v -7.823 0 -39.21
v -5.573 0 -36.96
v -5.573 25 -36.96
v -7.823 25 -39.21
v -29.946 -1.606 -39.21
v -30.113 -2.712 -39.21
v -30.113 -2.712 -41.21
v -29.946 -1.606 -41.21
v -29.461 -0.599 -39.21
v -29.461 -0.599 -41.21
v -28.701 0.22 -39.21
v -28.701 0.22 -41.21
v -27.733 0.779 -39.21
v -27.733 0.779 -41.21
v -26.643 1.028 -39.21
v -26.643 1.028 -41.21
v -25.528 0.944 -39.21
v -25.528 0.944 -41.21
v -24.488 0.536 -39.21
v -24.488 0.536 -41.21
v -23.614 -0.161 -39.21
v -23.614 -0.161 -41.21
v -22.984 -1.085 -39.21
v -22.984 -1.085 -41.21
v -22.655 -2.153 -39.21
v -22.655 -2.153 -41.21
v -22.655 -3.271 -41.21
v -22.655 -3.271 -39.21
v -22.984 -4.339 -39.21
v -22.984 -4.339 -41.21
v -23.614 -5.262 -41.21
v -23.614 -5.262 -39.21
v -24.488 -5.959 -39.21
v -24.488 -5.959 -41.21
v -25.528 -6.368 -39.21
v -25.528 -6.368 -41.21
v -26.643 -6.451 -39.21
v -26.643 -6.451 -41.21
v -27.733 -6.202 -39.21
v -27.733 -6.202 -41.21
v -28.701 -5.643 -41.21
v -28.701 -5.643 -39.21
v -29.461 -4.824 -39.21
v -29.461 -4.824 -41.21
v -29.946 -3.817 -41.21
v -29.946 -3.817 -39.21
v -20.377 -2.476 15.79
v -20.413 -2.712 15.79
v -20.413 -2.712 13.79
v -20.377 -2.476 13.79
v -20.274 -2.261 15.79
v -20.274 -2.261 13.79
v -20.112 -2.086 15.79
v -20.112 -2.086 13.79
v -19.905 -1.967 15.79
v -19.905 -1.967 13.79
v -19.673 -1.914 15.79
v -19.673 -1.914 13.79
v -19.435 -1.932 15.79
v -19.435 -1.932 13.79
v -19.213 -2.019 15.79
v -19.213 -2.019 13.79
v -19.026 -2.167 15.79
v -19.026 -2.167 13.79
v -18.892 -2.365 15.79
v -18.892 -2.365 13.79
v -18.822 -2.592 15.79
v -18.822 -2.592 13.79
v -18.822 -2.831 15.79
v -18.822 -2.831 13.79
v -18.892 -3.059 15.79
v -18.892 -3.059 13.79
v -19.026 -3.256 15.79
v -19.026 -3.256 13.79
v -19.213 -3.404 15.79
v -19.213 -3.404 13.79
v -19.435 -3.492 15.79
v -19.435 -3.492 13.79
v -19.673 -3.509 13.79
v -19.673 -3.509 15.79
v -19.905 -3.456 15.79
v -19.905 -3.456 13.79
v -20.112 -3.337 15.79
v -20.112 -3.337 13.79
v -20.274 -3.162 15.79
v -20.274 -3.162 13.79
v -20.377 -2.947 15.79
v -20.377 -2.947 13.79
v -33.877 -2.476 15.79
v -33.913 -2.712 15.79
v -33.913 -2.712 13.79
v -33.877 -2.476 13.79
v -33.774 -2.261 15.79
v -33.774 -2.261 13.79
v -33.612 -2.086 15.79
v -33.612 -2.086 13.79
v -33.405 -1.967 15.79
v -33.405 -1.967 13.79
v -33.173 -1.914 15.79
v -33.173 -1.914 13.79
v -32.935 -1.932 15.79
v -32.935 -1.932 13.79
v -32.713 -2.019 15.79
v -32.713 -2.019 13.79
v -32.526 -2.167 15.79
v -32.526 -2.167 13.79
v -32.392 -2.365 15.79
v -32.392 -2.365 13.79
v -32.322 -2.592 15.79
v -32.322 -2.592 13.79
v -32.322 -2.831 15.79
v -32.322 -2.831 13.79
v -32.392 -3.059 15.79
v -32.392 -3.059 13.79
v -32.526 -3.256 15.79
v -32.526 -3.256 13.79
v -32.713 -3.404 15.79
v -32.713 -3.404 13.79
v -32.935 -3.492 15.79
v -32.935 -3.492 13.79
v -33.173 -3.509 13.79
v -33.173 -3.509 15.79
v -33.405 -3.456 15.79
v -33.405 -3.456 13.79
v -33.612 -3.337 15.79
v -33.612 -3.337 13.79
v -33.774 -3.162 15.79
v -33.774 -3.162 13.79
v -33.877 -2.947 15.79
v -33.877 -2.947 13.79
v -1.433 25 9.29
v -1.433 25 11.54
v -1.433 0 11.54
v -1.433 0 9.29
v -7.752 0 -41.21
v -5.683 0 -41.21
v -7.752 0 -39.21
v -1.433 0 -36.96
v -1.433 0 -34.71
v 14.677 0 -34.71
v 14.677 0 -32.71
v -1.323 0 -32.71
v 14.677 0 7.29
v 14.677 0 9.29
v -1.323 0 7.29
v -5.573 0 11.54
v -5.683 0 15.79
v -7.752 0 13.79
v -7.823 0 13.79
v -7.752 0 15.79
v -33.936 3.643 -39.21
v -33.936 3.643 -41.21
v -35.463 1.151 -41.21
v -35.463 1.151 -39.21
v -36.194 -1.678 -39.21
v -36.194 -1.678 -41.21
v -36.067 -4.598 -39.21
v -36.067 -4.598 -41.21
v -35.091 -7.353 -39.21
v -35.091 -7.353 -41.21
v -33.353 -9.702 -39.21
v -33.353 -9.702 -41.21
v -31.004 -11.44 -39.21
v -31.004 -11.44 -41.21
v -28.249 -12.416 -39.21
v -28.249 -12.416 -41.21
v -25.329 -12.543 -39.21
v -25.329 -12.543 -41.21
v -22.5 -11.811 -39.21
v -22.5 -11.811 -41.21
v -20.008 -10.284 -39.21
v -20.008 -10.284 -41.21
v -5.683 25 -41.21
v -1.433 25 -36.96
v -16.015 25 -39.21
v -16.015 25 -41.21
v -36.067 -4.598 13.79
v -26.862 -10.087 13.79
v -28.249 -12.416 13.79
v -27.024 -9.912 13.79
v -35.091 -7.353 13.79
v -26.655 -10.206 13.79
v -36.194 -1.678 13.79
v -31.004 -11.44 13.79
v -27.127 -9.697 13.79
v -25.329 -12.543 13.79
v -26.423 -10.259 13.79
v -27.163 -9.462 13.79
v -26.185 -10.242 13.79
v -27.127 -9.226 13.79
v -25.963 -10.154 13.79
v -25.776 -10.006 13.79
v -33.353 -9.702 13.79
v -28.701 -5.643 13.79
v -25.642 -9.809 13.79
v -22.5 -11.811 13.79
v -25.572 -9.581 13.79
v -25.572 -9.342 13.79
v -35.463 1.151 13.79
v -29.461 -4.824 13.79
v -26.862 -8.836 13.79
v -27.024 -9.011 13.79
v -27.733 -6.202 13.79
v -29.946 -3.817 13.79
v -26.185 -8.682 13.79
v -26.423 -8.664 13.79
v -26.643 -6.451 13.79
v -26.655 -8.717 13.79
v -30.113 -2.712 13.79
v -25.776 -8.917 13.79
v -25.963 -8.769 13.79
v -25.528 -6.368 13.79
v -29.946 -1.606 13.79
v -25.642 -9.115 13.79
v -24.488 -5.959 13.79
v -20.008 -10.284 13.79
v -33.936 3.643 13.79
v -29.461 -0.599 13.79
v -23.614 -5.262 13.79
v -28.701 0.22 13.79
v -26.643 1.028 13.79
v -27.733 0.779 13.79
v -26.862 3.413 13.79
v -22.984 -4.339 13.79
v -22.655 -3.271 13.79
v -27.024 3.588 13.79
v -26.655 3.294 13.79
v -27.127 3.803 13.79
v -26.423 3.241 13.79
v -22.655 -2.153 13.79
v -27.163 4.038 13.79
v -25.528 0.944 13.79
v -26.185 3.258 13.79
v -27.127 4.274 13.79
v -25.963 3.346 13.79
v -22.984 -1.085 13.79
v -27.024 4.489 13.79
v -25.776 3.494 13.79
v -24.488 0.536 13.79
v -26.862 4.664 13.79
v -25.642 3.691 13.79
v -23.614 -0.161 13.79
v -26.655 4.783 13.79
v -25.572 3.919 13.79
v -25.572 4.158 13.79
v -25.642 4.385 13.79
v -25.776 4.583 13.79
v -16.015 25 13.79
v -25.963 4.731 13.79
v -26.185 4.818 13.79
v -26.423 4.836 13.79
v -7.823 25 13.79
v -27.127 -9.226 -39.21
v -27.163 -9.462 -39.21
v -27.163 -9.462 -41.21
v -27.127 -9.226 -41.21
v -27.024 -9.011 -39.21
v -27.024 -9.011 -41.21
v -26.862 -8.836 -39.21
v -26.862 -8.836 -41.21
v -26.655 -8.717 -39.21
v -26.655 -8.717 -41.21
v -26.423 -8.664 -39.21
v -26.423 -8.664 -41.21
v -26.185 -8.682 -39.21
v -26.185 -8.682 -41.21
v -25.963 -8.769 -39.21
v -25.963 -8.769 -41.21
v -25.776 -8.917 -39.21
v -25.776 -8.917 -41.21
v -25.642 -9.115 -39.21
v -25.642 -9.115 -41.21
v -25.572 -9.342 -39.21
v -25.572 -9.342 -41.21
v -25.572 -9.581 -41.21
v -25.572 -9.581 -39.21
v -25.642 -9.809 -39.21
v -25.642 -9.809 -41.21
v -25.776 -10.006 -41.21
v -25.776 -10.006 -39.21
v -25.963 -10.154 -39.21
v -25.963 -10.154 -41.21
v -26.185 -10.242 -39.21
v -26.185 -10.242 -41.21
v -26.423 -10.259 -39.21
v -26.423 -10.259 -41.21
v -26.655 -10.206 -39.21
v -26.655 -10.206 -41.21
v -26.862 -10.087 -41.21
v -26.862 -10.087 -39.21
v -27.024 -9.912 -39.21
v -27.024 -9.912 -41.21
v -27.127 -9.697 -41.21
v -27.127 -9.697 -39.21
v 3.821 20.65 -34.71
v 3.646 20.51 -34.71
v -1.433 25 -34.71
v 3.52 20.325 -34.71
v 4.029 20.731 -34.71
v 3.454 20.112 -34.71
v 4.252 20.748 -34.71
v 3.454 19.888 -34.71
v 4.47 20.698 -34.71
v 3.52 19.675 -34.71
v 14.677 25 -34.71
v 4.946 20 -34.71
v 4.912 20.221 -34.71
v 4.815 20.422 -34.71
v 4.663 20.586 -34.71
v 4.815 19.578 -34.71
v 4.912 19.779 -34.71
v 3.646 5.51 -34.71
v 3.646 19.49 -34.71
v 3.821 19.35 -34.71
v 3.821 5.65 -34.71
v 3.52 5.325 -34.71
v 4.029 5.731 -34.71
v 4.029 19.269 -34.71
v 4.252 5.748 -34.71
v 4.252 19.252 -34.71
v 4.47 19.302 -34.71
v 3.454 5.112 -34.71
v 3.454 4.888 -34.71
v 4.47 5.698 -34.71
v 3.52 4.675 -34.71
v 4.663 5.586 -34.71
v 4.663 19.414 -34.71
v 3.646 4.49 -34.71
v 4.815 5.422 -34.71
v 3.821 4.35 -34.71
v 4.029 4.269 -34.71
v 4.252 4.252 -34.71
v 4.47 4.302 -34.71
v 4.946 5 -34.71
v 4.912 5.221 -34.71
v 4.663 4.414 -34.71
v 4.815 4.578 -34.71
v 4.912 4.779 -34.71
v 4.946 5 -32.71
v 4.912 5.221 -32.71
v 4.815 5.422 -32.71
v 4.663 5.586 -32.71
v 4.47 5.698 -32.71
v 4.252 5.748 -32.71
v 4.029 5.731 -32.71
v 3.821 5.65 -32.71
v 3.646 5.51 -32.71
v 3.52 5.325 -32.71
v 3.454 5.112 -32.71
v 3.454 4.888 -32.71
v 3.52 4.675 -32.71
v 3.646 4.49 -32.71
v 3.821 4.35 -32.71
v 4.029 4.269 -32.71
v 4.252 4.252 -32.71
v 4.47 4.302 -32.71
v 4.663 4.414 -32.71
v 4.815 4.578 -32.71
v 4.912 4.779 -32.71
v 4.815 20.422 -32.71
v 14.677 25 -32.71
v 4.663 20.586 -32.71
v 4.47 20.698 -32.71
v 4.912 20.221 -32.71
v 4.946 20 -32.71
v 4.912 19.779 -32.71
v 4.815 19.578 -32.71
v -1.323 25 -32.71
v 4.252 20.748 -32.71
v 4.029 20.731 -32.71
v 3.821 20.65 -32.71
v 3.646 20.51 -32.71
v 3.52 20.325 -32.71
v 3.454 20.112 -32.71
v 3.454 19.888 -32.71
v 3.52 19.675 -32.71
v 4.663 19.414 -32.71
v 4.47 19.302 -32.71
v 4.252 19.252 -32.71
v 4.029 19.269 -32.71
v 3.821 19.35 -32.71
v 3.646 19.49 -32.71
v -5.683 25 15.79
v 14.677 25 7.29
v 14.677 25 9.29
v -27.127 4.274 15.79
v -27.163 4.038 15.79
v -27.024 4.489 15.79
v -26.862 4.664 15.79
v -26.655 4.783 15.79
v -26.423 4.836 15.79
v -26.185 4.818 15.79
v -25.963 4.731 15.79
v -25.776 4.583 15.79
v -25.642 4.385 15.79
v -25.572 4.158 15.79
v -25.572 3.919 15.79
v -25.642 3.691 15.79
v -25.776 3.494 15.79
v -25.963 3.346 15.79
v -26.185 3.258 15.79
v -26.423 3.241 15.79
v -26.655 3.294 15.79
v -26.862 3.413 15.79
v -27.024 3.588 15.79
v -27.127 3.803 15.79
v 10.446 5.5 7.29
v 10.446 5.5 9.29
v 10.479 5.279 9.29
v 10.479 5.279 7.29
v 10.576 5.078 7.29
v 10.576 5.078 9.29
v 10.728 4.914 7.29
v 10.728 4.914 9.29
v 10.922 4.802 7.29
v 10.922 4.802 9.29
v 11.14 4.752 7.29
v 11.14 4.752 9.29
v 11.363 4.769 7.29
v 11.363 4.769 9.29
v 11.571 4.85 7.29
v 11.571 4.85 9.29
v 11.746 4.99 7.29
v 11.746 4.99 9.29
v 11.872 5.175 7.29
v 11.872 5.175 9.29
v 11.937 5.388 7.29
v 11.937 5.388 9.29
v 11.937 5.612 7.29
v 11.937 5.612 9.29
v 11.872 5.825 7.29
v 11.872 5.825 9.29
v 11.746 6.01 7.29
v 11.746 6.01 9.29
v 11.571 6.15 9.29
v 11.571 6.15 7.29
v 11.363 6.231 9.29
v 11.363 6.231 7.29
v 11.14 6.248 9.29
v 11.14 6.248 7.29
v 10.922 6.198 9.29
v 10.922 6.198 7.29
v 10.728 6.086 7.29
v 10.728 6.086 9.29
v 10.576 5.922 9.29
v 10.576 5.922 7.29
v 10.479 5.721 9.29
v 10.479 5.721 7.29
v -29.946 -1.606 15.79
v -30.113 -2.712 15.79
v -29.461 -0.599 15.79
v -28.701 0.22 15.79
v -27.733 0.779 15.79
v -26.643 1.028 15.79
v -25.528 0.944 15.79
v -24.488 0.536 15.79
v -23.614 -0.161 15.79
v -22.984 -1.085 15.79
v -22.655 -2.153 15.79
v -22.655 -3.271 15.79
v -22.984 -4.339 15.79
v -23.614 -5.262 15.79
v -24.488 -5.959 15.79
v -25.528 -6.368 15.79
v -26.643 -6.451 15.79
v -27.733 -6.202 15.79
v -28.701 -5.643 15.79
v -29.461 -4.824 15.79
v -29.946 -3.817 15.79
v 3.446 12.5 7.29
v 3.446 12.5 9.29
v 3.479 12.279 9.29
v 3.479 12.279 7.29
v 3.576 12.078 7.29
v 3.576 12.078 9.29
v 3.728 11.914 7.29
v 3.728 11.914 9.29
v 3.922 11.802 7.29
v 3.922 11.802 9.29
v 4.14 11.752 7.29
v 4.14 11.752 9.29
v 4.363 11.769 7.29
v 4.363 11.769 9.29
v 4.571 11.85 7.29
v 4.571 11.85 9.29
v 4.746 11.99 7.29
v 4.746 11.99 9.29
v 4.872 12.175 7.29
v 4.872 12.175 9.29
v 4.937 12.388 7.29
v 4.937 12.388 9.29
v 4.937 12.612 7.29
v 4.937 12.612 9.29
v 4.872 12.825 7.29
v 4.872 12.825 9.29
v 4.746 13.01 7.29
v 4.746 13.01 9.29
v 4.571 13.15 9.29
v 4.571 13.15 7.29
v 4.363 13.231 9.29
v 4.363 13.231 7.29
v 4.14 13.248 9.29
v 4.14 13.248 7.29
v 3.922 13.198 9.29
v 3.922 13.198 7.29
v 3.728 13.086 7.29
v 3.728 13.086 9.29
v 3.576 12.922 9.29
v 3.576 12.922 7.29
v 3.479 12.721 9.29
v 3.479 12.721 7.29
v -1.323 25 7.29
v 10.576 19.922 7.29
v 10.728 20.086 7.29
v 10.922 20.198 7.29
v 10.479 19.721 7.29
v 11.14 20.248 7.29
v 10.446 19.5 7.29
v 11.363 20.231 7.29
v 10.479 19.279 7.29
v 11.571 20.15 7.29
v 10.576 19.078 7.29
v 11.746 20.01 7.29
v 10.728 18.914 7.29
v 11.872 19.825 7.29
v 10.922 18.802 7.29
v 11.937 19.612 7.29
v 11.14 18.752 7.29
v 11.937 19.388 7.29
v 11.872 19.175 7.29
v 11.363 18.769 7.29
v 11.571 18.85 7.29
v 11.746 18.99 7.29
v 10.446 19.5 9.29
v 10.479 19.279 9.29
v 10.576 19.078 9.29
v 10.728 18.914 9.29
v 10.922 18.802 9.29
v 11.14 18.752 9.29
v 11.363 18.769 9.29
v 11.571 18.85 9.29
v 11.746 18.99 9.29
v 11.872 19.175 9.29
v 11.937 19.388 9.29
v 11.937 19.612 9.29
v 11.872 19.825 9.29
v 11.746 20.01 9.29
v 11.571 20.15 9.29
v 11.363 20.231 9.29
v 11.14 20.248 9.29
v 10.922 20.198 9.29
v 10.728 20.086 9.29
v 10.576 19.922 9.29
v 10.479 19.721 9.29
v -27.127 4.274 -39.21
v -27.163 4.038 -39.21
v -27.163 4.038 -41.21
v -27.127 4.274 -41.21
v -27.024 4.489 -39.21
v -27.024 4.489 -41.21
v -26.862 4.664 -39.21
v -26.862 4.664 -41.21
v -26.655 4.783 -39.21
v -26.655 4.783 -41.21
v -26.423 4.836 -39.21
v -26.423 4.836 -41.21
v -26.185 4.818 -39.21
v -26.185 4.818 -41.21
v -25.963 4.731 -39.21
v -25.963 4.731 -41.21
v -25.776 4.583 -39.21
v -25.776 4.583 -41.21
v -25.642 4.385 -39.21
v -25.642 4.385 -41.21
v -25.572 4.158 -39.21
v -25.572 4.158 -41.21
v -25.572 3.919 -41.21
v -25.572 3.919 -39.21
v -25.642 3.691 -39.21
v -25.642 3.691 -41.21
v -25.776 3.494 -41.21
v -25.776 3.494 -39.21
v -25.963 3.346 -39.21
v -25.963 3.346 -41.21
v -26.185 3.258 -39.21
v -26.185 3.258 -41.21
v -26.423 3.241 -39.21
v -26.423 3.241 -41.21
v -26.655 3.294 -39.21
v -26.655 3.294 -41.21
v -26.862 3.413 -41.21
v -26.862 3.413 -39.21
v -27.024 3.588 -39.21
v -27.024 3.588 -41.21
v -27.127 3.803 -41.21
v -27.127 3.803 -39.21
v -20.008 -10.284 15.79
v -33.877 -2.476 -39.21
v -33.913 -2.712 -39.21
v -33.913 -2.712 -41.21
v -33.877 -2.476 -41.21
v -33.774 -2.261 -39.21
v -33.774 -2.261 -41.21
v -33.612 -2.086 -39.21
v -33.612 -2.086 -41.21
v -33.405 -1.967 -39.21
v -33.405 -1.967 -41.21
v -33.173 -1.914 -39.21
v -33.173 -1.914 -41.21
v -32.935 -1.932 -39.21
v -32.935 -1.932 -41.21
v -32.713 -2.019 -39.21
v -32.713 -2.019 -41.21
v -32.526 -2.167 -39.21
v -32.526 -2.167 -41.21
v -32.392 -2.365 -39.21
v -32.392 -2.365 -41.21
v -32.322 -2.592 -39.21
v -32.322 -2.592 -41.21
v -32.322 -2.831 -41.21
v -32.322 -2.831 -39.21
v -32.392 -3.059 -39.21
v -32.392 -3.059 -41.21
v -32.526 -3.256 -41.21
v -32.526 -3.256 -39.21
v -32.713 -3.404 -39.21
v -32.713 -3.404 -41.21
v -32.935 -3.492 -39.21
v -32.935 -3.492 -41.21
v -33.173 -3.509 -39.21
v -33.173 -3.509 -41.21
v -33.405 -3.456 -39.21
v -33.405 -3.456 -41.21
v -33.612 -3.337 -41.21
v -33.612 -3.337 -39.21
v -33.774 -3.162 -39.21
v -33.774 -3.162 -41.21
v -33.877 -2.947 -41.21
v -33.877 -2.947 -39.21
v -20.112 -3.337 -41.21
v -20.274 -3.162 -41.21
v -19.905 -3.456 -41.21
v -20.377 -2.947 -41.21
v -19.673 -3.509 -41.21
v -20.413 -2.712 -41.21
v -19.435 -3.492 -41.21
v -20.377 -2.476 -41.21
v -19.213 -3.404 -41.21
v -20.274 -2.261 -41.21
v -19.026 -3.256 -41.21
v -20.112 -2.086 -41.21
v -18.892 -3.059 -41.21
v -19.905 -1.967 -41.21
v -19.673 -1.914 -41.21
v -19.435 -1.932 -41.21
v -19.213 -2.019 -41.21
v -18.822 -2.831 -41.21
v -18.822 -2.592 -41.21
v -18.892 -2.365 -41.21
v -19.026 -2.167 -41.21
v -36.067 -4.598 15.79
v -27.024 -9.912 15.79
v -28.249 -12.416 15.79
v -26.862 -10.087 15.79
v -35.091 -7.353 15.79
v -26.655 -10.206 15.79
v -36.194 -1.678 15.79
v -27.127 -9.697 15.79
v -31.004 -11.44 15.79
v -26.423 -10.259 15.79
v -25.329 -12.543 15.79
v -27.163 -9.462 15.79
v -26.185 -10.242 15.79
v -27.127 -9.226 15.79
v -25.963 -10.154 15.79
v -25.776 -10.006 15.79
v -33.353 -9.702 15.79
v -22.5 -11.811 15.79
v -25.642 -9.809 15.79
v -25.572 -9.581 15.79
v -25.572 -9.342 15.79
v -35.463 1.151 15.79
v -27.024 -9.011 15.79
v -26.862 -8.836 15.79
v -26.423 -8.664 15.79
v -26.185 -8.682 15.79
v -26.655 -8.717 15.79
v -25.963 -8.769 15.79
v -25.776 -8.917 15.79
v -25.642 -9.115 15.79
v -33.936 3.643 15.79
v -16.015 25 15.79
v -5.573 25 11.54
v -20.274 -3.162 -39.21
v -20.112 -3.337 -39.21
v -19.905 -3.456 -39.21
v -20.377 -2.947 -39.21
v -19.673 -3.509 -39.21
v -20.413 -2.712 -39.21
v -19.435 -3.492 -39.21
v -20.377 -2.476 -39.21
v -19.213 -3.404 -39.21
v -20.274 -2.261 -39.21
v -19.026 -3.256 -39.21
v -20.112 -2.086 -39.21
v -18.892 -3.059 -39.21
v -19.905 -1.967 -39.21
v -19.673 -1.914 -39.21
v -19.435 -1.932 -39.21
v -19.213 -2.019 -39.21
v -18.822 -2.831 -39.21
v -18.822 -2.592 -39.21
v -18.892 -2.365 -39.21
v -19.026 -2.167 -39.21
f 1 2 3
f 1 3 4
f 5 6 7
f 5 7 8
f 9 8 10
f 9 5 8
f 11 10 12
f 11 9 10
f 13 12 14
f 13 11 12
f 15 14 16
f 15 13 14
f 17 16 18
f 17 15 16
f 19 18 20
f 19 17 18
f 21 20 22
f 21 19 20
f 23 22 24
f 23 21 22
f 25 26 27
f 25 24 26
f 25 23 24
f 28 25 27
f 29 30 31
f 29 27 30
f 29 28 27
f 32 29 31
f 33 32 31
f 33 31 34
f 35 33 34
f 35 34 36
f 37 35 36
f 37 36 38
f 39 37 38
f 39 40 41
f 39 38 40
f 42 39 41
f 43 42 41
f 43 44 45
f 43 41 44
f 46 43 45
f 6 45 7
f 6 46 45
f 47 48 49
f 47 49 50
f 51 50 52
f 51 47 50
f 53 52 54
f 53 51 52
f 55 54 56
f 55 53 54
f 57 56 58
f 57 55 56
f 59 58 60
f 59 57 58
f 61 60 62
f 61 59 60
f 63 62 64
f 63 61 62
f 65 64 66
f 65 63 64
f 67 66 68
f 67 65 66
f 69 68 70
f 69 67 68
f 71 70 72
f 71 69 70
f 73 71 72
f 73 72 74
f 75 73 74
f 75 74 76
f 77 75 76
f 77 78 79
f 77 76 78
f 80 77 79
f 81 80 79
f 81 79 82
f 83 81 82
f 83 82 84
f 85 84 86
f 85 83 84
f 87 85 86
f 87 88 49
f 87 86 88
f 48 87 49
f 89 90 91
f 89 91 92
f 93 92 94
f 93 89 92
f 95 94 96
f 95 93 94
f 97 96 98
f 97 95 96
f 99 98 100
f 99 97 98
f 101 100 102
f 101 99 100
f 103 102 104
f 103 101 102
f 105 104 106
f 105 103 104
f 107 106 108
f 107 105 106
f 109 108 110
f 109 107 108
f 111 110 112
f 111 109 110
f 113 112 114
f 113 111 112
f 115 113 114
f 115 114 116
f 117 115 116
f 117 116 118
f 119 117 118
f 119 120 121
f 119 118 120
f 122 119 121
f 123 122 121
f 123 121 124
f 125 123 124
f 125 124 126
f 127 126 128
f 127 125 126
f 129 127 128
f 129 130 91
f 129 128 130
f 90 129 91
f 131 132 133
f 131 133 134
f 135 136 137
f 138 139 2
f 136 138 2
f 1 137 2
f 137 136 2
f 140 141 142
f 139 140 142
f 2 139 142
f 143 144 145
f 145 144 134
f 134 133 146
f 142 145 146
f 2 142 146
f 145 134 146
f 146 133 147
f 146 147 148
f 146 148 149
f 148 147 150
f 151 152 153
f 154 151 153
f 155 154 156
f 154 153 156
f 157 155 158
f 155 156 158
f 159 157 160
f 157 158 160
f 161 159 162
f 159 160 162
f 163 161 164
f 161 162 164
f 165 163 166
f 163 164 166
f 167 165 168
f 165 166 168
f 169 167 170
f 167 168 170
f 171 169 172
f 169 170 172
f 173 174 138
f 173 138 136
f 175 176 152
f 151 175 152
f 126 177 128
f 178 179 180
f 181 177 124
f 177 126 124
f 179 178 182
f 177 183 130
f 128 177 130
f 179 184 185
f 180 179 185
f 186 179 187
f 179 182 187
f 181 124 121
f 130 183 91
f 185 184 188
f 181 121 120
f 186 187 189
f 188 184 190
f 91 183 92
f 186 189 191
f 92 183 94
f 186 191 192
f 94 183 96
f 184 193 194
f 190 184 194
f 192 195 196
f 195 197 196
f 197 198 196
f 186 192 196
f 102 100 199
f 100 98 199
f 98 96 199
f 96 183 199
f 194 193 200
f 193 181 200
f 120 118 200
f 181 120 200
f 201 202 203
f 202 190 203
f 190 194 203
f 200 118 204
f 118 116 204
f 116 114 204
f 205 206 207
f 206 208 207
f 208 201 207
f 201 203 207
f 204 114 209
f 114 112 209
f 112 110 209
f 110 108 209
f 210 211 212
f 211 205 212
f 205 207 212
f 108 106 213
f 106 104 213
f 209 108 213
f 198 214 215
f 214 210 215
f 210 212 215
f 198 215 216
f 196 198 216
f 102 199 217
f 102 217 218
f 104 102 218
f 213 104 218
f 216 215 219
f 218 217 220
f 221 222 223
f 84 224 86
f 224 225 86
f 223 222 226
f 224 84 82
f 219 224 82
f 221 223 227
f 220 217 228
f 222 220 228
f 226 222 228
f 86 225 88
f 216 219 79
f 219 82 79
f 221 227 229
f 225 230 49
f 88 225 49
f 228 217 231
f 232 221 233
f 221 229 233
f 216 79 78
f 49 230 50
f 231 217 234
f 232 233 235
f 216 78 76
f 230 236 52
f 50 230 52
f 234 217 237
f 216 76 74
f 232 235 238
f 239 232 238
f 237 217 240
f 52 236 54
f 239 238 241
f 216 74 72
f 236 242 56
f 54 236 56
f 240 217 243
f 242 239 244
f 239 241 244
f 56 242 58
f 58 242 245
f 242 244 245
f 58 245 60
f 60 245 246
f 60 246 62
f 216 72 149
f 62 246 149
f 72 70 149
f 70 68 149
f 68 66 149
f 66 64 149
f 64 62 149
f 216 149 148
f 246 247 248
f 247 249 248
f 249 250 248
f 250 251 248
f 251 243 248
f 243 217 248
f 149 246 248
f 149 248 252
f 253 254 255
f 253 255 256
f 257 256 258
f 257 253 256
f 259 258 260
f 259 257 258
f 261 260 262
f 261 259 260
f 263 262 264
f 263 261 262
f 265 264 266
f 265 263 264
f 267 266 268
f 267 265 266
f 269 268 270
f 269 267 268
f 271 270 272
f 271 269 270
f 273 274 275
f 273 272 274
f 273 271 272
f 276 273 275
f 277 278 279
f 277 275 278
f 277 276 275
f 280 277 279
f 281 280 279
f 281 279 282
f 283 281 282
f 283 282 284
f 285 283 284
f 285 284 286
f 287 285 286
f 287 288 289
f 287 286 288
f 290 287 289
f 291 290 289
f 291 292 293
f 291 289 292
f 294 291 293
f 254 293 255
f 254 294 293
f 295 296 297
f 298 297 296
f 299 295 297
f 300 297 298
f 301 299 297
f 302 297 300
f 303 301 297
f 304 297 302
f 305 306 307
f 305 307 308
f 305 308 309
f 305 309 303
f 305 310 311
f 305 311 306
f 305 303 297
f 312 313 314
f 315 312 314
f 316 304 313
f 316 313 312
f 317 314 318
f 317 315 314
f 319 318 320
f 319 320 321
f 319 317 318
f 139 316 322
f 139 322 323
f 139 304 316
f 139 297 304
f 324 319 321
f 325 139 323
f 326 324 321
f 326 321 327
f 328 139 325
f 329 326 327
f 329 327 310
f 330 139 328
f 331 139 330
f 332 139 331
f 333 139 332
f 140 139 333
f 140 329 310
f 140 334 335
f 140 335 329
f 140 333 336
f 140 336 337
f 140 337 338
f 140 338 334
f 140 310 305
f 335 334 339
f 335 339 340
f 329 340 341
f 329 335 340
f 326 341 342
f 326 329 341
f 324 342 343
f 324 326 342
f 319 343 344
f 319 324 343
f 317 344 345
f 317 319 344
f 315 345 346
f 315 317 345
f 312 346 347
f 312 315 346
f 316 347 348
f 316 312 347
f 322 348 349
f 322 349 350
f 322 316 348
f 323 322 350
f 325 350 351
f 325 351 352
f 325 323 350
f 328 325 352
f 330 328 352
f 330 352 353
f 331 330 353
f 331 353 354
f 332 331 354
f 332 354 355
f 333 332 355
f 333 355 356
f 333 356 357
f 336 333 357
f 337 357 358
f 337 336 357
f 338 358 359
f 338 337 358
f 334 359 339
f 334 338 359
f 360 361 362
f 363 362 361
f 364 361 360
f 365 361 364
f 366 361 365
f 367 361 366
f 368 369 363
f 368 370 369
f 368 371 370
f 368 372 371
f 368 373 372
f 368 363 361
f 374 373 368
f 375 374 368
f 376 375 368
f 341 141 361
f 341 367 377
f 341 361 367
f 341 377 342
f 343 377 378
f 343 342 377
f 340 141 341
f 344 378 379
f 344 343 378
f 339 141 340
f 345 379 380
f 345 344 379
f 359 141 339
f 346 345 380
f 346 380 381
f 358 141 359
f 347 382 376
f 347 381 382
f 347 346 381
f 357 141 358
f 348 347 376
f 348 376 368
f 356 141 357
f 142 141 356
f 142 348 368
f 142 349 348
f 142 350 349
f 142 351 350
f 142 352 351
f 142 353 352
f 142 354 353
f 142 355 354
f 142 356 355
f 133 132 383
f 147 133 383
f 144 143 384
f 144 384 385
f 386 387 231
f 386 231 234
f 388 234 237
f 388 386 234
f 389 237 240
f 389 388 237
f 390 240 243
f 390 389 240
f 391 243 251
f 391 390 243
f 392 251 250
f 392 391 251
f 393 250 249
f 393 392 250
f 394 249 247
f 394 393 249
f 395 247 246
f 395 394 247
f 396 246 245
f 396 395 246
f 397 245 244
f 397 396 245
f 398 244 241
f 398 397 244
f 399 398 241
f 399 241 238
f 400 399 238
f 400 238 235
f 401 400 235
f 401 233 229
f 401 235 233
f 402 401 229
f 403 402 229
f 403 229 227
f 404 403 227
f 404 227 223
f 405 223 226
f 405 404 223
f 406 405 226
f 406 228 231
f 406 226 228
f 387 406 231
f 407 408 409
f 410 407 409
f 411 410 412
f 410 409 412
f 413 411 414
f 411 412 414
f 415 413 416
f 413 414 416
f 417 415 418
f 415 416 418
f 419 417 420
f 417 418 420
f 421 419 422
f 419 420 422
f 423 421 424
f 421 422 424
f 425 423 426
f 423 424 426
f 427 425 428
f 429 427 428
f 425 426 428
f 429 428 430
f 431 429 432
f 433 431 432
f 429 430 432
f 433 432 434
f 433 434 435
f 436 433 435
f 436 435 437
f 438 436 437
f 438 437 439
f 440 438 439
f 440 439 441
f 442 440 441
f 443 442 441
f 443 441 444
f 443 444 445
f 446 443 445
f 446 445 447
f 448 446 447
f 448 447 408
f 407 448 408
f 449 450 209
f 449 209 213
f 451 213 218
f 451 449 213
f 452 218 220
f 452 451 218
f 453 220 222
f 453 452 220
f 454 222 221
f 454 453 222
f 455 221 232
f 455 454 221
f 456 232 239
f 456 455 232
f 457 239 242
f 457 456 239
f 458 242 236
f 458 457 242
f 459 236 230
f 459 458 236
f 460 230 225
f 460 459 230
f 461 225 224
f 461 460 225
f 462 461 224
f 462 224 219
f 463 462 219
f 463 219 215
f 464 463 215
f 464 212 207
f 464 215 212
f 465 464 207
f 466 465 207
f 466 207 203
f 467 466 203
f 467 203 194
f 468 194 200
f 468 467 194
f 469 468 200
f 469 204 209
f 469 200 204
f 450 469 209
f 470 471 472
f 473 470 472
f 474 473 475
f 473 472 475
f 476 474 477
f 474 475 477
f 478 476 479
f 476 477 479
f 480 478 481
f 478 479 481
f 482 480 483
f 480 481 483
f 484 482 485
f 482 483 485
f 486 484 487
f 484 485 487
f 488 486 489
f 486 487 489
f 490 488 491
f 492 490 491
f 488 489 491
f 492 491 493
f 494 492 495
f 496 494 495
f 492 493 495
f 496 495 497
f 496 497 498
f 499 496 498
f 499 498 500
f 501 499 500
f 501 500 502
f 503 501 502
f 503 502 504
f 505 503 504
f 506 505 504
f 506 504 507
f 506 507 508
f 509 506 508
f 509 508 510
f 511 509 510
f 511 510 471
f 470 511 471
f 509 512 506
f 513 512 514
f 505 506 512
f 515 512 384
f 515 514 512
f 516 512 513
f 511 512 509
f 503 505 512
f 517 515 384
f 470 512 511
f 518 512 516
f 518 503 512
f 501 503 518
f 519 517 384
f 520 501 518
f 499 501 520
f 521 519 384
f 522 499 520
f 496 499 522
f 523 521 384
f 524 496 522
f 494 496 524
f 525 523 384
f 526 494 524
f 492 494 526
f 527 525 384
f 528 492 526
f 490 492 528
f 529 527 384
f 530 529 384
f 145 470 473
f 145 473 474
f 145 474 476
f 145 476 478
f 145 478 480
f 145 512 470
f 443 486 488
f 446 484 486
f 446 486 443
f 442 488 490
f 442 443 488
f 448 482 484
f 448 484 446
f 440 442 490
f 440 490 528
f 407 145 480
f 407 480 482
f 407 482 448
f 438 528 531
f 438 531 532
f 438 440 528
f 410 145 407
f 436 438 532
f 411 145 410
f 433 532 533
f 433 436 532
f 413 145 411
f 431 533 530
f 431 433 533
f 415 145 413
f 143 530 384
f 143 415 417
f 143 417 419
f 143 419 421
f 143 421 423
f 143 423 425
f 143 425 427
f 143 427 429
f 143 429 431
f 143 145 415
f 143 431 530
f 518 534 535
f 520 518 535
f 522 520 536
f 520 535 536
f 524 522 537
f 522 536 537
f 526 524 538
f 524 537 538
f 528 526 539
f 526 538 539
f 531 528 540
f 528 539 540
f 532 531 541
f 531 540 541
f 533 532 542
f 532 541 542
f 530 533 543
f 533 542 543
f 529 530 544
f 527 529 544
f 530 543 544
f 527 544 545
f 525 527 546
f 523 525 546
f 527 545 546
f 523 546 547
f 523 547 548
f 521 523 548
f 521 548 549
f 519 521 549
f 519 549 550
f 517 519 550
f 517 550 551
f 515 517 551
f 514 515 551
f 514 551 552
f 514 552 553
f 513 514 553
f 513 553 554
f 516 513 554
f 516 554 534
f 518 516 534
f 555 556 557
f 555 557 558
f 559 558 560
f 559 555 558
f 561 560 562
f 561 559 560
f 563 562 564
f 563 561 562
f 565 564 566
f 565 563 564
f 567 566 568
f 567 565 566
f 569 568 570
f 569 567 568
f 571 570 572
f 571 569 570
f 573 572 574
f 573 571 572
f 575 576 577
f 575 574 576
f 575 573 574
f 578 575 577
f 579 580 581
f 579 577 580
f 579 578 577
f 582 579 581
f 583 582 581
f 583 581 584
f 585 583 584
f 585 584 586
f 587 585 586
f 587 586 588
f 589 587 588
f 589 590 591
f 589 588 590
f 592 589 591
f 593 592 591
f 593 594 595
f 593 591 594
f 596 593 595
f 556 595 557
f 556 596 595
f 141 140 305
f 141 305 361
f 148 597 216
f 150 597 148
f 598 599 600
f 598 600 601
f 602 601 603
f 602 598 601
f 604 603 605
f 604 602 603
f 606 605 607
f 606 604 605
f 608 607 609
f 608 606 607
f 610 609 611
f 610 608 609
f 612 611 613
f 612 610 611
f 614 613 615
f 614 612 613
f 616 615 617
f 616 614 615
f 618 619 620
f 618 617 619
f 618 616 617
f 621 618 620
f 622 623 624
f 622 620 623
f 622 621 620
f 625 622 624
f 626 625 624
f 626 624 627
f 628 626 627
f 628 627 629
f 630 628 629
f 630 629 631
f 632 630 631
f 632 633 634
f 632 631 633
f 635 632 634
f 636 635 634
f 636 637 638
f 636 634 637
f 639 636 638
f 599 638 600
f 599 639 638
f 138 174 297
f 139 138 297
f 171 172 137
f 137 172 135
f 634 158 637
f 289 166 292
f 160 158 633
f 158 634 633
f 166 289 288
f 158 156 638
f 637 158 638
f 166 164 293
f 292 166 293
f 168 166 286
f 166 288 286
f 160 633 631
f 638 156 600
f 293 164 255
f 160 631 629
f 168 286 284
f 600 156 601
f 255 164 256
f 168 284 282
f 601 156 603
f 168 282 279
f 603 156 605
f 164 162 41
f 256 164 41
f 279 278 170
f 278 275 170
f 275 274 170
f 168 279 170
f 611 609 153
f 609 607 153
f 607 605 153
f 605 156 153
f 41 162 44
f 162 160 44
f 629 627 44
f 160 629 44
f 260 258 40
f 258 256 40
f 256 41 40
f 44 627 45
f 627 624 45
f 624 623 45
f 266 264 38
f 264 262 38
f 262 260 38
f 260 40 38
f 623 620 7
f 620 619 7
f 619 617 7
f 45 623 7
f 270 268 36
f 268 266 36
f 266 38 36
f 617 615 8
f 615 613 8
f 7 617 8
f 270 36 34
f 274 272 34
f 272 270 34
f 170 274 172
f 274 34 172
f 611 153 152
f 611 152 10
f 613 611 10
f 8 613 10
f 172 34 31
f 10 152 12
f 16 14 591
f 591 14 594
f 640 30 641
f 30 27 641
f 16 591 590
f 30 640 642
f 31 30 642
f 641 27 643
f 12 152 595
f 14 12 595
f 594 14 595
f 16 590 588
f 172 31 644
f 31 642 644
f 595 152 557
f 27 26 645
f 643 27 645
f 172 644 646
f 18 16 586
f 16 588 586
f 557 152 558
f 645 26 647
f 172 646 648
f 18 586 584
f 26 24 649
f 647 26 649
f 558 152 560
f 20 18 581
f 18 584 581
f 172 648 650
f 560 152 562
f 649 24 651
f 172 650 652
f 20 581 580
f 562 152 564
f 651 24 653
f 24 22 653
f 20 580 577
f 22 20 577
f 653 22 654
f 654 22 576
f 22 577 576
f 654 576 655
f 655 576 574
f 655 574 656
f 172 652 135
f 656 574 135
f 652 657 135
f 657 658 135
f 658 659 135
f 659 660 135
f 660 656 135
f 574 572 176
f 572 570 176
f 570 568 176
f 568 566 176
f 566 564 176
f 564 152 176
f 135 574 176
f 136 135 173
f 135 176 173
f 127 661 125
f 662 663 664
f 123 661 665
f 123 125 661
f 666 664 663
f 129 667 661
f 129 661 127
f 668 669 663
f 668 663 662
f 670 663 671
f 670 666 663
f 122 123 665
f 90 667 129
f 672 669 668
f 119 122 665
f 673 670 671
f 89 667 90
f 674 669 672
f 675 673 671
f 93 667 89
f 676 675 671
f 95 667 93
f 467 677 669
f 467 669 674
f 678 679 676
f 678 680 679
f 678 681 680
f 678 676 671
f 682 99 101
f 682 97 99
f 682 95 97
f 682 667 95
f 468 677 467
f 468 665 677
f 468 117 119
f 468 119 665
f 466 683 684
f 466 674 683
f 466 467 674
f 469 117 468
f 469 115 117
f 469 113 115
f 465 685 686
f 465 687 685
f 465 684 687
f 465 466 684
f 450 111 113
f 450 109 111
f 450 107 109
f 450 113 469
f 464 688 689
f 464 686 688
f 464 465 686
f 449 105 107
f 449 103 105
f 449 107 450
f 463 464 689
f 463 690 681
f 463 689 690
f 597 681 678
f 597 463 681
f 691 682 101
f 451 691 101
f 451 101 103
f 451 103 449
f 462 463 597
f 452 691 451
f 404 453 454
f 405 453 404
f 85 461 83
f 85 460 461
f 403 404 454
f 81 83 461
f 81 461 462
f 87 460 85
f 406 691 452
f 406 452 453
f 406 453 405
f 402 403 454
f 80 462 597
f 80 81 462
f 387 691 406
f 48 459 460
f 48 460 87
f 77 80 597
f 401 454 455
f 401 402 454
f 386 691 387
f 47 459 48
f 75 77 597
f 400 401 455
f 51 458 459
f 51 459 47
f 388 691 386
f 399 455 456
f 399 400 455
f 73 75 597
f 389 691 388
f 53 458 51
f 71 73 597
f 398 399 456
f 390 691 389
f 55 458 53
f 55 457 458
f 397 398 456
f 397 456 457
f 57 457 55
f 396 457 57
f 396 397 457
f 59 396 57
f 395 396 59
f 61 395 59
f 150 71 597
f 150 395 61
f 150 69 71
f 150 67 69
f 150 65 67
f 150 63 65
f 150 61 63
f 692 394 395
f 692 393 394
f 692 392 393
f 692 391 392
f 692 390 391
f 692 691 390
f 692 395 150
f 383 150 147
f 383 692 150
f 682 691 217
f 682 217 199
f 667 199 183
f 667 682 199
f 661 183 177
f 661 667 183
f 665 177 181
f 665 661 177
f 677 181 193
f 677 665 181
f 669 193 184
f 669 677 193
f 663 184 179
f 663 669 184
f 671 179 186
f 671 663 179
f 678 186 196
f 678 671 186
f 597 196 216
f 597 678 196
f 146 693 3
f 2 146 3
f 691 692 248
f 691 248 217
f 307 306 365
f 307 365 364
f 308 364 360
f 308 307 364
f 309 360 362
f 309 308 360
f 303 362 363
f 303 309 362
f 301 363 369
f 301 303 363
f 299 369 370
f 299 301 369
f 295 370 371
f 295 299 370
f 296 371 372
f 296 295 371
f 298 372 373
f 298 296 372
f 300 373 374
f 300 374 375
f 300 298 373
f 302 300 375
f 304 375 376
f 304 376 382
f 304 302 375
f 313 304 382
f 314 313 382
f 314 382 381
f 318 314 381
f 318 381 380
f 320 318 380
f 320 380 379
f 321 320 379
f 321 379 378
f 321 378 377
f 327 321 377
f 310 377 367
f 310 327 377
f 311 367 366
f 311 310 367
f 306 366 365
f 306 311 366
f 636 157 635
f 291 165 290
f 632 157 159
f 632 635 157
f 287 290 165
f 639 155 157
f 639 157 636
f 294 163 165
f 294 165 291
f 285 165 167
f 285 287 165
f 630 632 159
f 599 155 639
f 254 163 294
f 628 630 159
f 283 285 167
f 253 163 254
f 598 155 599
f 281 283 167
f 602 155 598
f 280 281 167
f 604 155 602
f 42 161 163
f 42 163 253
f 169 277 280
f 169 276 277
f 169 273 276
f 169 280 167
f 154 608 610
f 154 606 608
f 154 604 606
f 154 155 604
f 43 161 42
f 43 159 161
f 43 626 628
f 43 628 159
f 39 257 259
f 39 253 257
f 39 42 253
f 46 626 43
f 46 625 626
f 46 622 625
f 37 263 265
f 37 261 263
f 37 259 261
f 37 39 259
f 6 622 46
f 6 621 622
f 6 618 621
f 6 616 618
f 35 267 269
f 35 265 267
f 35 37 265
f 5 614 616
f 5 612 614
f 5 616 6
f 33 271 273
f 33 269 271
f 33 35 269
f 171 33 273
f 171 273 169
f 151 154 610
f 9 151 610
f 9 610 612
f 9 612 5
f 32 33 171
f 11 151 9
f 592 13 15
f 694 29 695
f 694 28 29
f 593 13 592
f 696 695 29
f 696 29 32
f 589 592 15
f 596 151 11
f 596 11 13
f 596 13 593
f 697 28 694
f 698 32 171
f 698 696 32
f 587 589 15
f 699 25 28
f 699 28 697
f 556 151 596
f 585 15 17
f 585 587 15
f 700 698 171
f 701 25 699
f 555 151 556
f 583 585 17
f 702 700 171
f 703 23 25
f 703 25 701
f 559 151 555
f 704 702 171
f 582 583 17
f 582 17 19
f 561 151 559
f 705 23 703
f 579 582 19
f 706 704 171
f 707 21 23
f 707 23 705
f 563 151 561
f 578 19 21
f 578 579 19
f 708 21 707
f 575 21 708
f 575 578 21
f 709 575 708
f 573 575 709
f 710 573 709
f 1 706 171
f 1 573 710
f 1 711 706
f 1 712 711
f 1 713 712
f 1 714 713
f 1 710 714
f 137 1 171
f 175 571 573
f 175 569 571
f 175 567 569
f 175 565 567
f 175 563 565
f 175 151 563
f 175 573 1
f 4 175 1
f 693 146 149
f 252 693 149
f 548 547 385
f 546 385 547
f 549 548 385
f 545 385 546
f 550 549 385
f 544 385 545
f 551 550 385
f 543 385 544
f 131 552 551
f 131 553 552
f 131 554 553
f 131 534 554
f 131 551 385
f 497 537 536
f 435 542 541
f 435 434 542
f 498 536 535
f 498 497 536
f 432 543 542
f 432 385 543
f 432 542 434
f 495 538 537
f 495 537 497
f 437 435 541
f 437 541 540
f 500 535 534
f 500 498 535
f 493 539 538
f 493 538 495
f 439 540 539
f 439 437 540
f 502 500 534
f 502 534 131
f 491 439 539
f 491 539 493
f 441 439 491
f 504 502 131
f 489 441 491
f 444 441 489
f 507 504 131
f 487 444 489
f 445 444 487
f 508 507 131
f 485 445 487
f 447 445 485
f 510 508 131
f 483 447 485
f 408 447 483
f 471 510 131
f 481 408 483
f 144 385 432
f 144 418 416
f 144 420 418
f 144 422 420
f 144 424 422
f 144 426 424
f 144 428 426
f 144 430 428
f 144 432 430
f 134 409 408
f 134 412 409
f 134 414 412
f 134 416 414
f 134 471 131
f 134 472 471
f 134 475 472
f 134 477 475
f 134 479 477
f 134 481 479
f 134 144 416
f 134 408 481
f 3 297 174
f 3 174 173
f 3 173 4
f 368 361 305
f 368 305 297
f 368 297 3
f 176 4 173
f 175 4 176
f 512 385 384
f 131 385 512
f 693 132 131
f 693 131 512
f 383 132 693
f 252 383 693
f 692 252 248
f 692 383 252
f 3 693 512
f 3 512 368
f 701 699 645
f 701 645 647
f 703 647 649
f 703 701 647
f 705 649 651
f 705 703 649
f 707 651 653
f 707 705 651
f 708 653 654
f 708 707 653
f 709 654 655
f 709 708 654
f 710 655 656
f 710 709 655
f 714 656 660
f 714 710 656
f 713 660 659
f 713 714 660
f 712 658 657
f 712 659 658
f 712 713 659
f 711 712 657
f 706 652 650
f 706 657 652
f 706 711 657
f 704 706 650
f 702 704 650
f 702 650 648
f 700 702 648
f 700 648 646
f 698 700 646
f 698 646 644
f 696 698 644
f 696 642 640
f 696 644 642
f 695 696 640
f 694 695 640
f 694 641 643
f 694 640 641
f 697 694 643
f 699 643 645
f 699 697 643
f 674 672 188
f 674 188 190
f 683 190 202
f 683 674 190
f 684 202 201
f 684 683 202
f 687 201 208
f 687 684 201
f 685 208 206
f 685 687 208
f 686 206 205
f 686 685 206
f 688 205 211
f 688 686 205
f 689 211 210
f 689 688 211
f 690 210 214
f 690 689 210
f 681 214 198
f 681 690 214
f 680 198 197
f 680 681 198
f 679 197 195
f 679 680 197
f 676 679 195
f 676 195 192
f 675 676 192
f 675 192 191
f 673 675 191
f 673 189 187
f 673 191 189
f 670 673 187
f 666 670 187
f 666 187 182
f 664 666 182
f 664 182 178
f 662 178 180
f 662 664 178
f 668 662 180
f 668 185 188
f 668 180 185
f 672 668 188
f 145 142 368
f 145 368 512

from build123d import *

# Parameters (mm, degrees)
EXTRUDE_1_DEPTH                 = 25
CUT_EXTRUDE_1_REACH             = 54.692
SKETCH_2_R                      = 0.75
CUT_EXTRUDE_1_DIRECTION_2_DEPTH = 53.691808082
EXTRUDE_2_DEPTH                 = 25
EXTRUDE_3_DEPTH                 = 2
CUT_EXTRUDE_4_DEPTH             = 73.027407742
CUT_EXTRUDE_4_DEPTH_BACK        = 73.027407742
SKETCH_6_R                      = 3.75
SKETCH_6_R_2                    = 0.8
CUT_EXTRUDE_START               = -44
SKETCH_8_R                      = 0.75
CUT_EXTRUDE_5_DEPTH             = 2


with BuildPart() as part:
    # 草图1 → 凸台-拉伸1 (new body)
    with BuildSketch(Plane(origin=(0, 0, 0), x_dir=(1, 0, 0), z_dir=(0, 1, 0))):
        Polygon((14.677419355, 32.709677419), (-1.322580645, 32.709677419), (-1.322580645, -7.290322581), (14.677419355, -7.290322581), (14.677419355, -9.290322581), (-3.322580645, -9.290322581), (-3.322580645, 34.709677419), (14.677419355, 34.709677419), align=None)
    extrude(amount=EXTRUDE_1_DEPTH)

    # 草图2 → 切除-拉伸1 (cut, up to next)
    with BuildSketch(Plane.XY.offset(9.290322581), mode=Mode.PRIVATE) as cut_extrude_1_sk1:
        with Locations(Location((4.195809336, 12.5, 0), (0, 0, 180))):
            Circle(SKETCH_2_R)
    cut_extrude_1_tool1 = extrude(cut_extrude_1_sk1.sketch, amount=-CUT_EXTRUDE_1_REACH, mode=Mode.PRIVATE) & part.part
    # 草图2 → 切除-拉伸1 (cut, up to next)
    with BuildSketch(Plane.XY.offset(9.290322581), mode=Mode.PRIVATE) as cut_extrude_1_sk2:
        with Locations(Location((11.195809336, 19.5, 0), (0, 0, 180))):
            Circle(SKETCH_2_R)
    cut_extrude_1_tool2 = extrude(cut_extrude_1_sk2.sketch, amount=-CUT_EXTRUDE_1_REACH, mode=Mode.PRIVATE) & part.part
    # 草图2 → 切除-拉伸1 (cut, up to next)
    with BuildSketch(Plane.XY.offset(9.290322581), mode=Mode.PRIVATE) as cut_extrude_1_sk3:
        with Locations(Location((11.195809336, 5.5, 0), (0, 0, 180))):
            Circle(SKETCH_2_R)
    cut_extrude_1_tool3 = extrude(cut_extrude_1_sk3.sketch, amount=-CUT_EXTRUDE_1_REACH, mode=Mode.PRIVATE) & part.part
    add(cut_extrude_1_tool1.solids().sort_by_distance((4.195809, 12.5, 9.290323))[0], mode=Mode.SUBTRACT)
    add(cut_extrude_1_tool2.solids().sort_by_distance((11.195809, 19.5, 9.290323))[0], mode=Mode.SUBTRACT)
    add(cut_extrude_1_tool3.solids().sort_by_distance((11.195809, 5.5, 9.290323))[0], mode=Mode.SUBTRACT)

    # 草图2 → 切除-拉伸1 direction 2 (cut)
    with BuildSketch(Plane.XY.offset(9.290322581)):
        with Locations(Location((4.195809336, 12.5, 0), (0, 0, 180))):
            Circle(SKETCH_2_R)
        with Locations(Location((11.195809336, 19.5, 0), (0, 0, 180))):
            Circle(SKETCH_2_R)
        with Locations(Location((11.195809336, 5.5, 0), (0, 0, 180))):
            Circle(SKETCH_2_R)
    extrude(amount=CUT_EXTRUDE_1_DIRECTION_2_DEPTH, mode=Mode.SUBTRACT)

    # 草图5 → 凸台-拉伸2 (add)
    with BuildSketch(Plane(origin=(0, 25, 0), x_dir=(1, 0, 0), z_dir=(0, 1, 0))):
        Polygon((-3.682839685, 39.209677419), (-1.432839685, 36.959677419), (-1.432839685, 34.709677419), (-3.322580645, 34.709677419), (-3.322580645, 32.459677419), (-3.322580645, 12.709677419), (-5.572580645, 12.709677419), (-5.572580645, 32.459677419), (-5.572580645, 36.959677419), (-7.822580645, 39.209677419), (-16.014767983, 39.209677419), (-16.014767983, 41.209677419), (-5.682839685, 41.209677419), align=None)
    extrude_2 = extrude(amount=-EXTRUDE_2_DEPTH)

    # 镜向1: 凸台-拉伸2 across plane
    add(extrude_2.mirror(Plane.XY.offset(-12.709677419)))

    # 草图7 → 凸台-拉伸3 (add)
    with BuildSketch(Plane(origin=(0, 0, -41.209677419), x_dir=(-1, 0, 0), z_dir=(0, 0, -1))):
        with BuildLine():
            Line((16.014767983, 25), (33.935605331, 3.642777708))
            ThreePointArc((33.935605331, 3.642777708), (33.352966922, -9.701835828), (20.008353386, -10.284474238))
            Line((20.008353386, -10.284474238), (7.751794264, 0))
            Line((7.751794264, 0), (16.014767983, 0))
            Line((16.014767983, 0), (16.014767983, 25))
        make_face()
    extrude_3 = extrude(amount=-EXTRUDE_3_DEPTH)

    # 镜向5: 凸台-拉伸3 across plane
    add(extrude_3.mirror(Plane.XY.offset(-12.709677419)))

    # 草图6 → 切除-拉伸4 (cut, two sides: drawn at the far end of the back side and taken through both)
    with BuildSketch(Plane(origin=(0, 0, -41.209677419), x_dir=(-1, 0, 0), z_dir=(0, 0, -1)).offset(-CUT_EXTRUDE_4_DEPTH_BACK)):
        with Locations((26.362741029, -2.711609936)):
            Circle(SKETCH_6_R)
        with Locations((33.112741029, -2.711609936)):
            Circle(SKETCH_6_R_2)
        with Locations((26.362741029, 4.038390064)):
            Circle(SKETCH_6_R_2)
        with Locations((19.612741029, -2.711609936)):
            Circle(SKETCH_6_R_2)
        with Locations((26.362741029, -9.461609936)):
            Circle(SKETCH_6_R_2)
    extrude(amount=CUT_EXTRUDE_4_DEPTH + CUT_EXTRUDE_4_DEPTH_BACK, mode=Mode.SUBTRACT)

    # 草图8 → 切除-拉伸5 (cut)
    with BuildSketch(Plane.XY.offset(9.290322581).offset(CUT_EXTRUDE_START)):
        with Locations((4.195809336, 20)):
            Circle(SKETCH_8_R)
        with Locations((4.195809336, 5)):
            Circle(SKETCH_8_R)
    extrude(amount=CUT_EXTRUDE_5_DEPTH, mode=Mode.SUBTRACT)


solid = part.part
